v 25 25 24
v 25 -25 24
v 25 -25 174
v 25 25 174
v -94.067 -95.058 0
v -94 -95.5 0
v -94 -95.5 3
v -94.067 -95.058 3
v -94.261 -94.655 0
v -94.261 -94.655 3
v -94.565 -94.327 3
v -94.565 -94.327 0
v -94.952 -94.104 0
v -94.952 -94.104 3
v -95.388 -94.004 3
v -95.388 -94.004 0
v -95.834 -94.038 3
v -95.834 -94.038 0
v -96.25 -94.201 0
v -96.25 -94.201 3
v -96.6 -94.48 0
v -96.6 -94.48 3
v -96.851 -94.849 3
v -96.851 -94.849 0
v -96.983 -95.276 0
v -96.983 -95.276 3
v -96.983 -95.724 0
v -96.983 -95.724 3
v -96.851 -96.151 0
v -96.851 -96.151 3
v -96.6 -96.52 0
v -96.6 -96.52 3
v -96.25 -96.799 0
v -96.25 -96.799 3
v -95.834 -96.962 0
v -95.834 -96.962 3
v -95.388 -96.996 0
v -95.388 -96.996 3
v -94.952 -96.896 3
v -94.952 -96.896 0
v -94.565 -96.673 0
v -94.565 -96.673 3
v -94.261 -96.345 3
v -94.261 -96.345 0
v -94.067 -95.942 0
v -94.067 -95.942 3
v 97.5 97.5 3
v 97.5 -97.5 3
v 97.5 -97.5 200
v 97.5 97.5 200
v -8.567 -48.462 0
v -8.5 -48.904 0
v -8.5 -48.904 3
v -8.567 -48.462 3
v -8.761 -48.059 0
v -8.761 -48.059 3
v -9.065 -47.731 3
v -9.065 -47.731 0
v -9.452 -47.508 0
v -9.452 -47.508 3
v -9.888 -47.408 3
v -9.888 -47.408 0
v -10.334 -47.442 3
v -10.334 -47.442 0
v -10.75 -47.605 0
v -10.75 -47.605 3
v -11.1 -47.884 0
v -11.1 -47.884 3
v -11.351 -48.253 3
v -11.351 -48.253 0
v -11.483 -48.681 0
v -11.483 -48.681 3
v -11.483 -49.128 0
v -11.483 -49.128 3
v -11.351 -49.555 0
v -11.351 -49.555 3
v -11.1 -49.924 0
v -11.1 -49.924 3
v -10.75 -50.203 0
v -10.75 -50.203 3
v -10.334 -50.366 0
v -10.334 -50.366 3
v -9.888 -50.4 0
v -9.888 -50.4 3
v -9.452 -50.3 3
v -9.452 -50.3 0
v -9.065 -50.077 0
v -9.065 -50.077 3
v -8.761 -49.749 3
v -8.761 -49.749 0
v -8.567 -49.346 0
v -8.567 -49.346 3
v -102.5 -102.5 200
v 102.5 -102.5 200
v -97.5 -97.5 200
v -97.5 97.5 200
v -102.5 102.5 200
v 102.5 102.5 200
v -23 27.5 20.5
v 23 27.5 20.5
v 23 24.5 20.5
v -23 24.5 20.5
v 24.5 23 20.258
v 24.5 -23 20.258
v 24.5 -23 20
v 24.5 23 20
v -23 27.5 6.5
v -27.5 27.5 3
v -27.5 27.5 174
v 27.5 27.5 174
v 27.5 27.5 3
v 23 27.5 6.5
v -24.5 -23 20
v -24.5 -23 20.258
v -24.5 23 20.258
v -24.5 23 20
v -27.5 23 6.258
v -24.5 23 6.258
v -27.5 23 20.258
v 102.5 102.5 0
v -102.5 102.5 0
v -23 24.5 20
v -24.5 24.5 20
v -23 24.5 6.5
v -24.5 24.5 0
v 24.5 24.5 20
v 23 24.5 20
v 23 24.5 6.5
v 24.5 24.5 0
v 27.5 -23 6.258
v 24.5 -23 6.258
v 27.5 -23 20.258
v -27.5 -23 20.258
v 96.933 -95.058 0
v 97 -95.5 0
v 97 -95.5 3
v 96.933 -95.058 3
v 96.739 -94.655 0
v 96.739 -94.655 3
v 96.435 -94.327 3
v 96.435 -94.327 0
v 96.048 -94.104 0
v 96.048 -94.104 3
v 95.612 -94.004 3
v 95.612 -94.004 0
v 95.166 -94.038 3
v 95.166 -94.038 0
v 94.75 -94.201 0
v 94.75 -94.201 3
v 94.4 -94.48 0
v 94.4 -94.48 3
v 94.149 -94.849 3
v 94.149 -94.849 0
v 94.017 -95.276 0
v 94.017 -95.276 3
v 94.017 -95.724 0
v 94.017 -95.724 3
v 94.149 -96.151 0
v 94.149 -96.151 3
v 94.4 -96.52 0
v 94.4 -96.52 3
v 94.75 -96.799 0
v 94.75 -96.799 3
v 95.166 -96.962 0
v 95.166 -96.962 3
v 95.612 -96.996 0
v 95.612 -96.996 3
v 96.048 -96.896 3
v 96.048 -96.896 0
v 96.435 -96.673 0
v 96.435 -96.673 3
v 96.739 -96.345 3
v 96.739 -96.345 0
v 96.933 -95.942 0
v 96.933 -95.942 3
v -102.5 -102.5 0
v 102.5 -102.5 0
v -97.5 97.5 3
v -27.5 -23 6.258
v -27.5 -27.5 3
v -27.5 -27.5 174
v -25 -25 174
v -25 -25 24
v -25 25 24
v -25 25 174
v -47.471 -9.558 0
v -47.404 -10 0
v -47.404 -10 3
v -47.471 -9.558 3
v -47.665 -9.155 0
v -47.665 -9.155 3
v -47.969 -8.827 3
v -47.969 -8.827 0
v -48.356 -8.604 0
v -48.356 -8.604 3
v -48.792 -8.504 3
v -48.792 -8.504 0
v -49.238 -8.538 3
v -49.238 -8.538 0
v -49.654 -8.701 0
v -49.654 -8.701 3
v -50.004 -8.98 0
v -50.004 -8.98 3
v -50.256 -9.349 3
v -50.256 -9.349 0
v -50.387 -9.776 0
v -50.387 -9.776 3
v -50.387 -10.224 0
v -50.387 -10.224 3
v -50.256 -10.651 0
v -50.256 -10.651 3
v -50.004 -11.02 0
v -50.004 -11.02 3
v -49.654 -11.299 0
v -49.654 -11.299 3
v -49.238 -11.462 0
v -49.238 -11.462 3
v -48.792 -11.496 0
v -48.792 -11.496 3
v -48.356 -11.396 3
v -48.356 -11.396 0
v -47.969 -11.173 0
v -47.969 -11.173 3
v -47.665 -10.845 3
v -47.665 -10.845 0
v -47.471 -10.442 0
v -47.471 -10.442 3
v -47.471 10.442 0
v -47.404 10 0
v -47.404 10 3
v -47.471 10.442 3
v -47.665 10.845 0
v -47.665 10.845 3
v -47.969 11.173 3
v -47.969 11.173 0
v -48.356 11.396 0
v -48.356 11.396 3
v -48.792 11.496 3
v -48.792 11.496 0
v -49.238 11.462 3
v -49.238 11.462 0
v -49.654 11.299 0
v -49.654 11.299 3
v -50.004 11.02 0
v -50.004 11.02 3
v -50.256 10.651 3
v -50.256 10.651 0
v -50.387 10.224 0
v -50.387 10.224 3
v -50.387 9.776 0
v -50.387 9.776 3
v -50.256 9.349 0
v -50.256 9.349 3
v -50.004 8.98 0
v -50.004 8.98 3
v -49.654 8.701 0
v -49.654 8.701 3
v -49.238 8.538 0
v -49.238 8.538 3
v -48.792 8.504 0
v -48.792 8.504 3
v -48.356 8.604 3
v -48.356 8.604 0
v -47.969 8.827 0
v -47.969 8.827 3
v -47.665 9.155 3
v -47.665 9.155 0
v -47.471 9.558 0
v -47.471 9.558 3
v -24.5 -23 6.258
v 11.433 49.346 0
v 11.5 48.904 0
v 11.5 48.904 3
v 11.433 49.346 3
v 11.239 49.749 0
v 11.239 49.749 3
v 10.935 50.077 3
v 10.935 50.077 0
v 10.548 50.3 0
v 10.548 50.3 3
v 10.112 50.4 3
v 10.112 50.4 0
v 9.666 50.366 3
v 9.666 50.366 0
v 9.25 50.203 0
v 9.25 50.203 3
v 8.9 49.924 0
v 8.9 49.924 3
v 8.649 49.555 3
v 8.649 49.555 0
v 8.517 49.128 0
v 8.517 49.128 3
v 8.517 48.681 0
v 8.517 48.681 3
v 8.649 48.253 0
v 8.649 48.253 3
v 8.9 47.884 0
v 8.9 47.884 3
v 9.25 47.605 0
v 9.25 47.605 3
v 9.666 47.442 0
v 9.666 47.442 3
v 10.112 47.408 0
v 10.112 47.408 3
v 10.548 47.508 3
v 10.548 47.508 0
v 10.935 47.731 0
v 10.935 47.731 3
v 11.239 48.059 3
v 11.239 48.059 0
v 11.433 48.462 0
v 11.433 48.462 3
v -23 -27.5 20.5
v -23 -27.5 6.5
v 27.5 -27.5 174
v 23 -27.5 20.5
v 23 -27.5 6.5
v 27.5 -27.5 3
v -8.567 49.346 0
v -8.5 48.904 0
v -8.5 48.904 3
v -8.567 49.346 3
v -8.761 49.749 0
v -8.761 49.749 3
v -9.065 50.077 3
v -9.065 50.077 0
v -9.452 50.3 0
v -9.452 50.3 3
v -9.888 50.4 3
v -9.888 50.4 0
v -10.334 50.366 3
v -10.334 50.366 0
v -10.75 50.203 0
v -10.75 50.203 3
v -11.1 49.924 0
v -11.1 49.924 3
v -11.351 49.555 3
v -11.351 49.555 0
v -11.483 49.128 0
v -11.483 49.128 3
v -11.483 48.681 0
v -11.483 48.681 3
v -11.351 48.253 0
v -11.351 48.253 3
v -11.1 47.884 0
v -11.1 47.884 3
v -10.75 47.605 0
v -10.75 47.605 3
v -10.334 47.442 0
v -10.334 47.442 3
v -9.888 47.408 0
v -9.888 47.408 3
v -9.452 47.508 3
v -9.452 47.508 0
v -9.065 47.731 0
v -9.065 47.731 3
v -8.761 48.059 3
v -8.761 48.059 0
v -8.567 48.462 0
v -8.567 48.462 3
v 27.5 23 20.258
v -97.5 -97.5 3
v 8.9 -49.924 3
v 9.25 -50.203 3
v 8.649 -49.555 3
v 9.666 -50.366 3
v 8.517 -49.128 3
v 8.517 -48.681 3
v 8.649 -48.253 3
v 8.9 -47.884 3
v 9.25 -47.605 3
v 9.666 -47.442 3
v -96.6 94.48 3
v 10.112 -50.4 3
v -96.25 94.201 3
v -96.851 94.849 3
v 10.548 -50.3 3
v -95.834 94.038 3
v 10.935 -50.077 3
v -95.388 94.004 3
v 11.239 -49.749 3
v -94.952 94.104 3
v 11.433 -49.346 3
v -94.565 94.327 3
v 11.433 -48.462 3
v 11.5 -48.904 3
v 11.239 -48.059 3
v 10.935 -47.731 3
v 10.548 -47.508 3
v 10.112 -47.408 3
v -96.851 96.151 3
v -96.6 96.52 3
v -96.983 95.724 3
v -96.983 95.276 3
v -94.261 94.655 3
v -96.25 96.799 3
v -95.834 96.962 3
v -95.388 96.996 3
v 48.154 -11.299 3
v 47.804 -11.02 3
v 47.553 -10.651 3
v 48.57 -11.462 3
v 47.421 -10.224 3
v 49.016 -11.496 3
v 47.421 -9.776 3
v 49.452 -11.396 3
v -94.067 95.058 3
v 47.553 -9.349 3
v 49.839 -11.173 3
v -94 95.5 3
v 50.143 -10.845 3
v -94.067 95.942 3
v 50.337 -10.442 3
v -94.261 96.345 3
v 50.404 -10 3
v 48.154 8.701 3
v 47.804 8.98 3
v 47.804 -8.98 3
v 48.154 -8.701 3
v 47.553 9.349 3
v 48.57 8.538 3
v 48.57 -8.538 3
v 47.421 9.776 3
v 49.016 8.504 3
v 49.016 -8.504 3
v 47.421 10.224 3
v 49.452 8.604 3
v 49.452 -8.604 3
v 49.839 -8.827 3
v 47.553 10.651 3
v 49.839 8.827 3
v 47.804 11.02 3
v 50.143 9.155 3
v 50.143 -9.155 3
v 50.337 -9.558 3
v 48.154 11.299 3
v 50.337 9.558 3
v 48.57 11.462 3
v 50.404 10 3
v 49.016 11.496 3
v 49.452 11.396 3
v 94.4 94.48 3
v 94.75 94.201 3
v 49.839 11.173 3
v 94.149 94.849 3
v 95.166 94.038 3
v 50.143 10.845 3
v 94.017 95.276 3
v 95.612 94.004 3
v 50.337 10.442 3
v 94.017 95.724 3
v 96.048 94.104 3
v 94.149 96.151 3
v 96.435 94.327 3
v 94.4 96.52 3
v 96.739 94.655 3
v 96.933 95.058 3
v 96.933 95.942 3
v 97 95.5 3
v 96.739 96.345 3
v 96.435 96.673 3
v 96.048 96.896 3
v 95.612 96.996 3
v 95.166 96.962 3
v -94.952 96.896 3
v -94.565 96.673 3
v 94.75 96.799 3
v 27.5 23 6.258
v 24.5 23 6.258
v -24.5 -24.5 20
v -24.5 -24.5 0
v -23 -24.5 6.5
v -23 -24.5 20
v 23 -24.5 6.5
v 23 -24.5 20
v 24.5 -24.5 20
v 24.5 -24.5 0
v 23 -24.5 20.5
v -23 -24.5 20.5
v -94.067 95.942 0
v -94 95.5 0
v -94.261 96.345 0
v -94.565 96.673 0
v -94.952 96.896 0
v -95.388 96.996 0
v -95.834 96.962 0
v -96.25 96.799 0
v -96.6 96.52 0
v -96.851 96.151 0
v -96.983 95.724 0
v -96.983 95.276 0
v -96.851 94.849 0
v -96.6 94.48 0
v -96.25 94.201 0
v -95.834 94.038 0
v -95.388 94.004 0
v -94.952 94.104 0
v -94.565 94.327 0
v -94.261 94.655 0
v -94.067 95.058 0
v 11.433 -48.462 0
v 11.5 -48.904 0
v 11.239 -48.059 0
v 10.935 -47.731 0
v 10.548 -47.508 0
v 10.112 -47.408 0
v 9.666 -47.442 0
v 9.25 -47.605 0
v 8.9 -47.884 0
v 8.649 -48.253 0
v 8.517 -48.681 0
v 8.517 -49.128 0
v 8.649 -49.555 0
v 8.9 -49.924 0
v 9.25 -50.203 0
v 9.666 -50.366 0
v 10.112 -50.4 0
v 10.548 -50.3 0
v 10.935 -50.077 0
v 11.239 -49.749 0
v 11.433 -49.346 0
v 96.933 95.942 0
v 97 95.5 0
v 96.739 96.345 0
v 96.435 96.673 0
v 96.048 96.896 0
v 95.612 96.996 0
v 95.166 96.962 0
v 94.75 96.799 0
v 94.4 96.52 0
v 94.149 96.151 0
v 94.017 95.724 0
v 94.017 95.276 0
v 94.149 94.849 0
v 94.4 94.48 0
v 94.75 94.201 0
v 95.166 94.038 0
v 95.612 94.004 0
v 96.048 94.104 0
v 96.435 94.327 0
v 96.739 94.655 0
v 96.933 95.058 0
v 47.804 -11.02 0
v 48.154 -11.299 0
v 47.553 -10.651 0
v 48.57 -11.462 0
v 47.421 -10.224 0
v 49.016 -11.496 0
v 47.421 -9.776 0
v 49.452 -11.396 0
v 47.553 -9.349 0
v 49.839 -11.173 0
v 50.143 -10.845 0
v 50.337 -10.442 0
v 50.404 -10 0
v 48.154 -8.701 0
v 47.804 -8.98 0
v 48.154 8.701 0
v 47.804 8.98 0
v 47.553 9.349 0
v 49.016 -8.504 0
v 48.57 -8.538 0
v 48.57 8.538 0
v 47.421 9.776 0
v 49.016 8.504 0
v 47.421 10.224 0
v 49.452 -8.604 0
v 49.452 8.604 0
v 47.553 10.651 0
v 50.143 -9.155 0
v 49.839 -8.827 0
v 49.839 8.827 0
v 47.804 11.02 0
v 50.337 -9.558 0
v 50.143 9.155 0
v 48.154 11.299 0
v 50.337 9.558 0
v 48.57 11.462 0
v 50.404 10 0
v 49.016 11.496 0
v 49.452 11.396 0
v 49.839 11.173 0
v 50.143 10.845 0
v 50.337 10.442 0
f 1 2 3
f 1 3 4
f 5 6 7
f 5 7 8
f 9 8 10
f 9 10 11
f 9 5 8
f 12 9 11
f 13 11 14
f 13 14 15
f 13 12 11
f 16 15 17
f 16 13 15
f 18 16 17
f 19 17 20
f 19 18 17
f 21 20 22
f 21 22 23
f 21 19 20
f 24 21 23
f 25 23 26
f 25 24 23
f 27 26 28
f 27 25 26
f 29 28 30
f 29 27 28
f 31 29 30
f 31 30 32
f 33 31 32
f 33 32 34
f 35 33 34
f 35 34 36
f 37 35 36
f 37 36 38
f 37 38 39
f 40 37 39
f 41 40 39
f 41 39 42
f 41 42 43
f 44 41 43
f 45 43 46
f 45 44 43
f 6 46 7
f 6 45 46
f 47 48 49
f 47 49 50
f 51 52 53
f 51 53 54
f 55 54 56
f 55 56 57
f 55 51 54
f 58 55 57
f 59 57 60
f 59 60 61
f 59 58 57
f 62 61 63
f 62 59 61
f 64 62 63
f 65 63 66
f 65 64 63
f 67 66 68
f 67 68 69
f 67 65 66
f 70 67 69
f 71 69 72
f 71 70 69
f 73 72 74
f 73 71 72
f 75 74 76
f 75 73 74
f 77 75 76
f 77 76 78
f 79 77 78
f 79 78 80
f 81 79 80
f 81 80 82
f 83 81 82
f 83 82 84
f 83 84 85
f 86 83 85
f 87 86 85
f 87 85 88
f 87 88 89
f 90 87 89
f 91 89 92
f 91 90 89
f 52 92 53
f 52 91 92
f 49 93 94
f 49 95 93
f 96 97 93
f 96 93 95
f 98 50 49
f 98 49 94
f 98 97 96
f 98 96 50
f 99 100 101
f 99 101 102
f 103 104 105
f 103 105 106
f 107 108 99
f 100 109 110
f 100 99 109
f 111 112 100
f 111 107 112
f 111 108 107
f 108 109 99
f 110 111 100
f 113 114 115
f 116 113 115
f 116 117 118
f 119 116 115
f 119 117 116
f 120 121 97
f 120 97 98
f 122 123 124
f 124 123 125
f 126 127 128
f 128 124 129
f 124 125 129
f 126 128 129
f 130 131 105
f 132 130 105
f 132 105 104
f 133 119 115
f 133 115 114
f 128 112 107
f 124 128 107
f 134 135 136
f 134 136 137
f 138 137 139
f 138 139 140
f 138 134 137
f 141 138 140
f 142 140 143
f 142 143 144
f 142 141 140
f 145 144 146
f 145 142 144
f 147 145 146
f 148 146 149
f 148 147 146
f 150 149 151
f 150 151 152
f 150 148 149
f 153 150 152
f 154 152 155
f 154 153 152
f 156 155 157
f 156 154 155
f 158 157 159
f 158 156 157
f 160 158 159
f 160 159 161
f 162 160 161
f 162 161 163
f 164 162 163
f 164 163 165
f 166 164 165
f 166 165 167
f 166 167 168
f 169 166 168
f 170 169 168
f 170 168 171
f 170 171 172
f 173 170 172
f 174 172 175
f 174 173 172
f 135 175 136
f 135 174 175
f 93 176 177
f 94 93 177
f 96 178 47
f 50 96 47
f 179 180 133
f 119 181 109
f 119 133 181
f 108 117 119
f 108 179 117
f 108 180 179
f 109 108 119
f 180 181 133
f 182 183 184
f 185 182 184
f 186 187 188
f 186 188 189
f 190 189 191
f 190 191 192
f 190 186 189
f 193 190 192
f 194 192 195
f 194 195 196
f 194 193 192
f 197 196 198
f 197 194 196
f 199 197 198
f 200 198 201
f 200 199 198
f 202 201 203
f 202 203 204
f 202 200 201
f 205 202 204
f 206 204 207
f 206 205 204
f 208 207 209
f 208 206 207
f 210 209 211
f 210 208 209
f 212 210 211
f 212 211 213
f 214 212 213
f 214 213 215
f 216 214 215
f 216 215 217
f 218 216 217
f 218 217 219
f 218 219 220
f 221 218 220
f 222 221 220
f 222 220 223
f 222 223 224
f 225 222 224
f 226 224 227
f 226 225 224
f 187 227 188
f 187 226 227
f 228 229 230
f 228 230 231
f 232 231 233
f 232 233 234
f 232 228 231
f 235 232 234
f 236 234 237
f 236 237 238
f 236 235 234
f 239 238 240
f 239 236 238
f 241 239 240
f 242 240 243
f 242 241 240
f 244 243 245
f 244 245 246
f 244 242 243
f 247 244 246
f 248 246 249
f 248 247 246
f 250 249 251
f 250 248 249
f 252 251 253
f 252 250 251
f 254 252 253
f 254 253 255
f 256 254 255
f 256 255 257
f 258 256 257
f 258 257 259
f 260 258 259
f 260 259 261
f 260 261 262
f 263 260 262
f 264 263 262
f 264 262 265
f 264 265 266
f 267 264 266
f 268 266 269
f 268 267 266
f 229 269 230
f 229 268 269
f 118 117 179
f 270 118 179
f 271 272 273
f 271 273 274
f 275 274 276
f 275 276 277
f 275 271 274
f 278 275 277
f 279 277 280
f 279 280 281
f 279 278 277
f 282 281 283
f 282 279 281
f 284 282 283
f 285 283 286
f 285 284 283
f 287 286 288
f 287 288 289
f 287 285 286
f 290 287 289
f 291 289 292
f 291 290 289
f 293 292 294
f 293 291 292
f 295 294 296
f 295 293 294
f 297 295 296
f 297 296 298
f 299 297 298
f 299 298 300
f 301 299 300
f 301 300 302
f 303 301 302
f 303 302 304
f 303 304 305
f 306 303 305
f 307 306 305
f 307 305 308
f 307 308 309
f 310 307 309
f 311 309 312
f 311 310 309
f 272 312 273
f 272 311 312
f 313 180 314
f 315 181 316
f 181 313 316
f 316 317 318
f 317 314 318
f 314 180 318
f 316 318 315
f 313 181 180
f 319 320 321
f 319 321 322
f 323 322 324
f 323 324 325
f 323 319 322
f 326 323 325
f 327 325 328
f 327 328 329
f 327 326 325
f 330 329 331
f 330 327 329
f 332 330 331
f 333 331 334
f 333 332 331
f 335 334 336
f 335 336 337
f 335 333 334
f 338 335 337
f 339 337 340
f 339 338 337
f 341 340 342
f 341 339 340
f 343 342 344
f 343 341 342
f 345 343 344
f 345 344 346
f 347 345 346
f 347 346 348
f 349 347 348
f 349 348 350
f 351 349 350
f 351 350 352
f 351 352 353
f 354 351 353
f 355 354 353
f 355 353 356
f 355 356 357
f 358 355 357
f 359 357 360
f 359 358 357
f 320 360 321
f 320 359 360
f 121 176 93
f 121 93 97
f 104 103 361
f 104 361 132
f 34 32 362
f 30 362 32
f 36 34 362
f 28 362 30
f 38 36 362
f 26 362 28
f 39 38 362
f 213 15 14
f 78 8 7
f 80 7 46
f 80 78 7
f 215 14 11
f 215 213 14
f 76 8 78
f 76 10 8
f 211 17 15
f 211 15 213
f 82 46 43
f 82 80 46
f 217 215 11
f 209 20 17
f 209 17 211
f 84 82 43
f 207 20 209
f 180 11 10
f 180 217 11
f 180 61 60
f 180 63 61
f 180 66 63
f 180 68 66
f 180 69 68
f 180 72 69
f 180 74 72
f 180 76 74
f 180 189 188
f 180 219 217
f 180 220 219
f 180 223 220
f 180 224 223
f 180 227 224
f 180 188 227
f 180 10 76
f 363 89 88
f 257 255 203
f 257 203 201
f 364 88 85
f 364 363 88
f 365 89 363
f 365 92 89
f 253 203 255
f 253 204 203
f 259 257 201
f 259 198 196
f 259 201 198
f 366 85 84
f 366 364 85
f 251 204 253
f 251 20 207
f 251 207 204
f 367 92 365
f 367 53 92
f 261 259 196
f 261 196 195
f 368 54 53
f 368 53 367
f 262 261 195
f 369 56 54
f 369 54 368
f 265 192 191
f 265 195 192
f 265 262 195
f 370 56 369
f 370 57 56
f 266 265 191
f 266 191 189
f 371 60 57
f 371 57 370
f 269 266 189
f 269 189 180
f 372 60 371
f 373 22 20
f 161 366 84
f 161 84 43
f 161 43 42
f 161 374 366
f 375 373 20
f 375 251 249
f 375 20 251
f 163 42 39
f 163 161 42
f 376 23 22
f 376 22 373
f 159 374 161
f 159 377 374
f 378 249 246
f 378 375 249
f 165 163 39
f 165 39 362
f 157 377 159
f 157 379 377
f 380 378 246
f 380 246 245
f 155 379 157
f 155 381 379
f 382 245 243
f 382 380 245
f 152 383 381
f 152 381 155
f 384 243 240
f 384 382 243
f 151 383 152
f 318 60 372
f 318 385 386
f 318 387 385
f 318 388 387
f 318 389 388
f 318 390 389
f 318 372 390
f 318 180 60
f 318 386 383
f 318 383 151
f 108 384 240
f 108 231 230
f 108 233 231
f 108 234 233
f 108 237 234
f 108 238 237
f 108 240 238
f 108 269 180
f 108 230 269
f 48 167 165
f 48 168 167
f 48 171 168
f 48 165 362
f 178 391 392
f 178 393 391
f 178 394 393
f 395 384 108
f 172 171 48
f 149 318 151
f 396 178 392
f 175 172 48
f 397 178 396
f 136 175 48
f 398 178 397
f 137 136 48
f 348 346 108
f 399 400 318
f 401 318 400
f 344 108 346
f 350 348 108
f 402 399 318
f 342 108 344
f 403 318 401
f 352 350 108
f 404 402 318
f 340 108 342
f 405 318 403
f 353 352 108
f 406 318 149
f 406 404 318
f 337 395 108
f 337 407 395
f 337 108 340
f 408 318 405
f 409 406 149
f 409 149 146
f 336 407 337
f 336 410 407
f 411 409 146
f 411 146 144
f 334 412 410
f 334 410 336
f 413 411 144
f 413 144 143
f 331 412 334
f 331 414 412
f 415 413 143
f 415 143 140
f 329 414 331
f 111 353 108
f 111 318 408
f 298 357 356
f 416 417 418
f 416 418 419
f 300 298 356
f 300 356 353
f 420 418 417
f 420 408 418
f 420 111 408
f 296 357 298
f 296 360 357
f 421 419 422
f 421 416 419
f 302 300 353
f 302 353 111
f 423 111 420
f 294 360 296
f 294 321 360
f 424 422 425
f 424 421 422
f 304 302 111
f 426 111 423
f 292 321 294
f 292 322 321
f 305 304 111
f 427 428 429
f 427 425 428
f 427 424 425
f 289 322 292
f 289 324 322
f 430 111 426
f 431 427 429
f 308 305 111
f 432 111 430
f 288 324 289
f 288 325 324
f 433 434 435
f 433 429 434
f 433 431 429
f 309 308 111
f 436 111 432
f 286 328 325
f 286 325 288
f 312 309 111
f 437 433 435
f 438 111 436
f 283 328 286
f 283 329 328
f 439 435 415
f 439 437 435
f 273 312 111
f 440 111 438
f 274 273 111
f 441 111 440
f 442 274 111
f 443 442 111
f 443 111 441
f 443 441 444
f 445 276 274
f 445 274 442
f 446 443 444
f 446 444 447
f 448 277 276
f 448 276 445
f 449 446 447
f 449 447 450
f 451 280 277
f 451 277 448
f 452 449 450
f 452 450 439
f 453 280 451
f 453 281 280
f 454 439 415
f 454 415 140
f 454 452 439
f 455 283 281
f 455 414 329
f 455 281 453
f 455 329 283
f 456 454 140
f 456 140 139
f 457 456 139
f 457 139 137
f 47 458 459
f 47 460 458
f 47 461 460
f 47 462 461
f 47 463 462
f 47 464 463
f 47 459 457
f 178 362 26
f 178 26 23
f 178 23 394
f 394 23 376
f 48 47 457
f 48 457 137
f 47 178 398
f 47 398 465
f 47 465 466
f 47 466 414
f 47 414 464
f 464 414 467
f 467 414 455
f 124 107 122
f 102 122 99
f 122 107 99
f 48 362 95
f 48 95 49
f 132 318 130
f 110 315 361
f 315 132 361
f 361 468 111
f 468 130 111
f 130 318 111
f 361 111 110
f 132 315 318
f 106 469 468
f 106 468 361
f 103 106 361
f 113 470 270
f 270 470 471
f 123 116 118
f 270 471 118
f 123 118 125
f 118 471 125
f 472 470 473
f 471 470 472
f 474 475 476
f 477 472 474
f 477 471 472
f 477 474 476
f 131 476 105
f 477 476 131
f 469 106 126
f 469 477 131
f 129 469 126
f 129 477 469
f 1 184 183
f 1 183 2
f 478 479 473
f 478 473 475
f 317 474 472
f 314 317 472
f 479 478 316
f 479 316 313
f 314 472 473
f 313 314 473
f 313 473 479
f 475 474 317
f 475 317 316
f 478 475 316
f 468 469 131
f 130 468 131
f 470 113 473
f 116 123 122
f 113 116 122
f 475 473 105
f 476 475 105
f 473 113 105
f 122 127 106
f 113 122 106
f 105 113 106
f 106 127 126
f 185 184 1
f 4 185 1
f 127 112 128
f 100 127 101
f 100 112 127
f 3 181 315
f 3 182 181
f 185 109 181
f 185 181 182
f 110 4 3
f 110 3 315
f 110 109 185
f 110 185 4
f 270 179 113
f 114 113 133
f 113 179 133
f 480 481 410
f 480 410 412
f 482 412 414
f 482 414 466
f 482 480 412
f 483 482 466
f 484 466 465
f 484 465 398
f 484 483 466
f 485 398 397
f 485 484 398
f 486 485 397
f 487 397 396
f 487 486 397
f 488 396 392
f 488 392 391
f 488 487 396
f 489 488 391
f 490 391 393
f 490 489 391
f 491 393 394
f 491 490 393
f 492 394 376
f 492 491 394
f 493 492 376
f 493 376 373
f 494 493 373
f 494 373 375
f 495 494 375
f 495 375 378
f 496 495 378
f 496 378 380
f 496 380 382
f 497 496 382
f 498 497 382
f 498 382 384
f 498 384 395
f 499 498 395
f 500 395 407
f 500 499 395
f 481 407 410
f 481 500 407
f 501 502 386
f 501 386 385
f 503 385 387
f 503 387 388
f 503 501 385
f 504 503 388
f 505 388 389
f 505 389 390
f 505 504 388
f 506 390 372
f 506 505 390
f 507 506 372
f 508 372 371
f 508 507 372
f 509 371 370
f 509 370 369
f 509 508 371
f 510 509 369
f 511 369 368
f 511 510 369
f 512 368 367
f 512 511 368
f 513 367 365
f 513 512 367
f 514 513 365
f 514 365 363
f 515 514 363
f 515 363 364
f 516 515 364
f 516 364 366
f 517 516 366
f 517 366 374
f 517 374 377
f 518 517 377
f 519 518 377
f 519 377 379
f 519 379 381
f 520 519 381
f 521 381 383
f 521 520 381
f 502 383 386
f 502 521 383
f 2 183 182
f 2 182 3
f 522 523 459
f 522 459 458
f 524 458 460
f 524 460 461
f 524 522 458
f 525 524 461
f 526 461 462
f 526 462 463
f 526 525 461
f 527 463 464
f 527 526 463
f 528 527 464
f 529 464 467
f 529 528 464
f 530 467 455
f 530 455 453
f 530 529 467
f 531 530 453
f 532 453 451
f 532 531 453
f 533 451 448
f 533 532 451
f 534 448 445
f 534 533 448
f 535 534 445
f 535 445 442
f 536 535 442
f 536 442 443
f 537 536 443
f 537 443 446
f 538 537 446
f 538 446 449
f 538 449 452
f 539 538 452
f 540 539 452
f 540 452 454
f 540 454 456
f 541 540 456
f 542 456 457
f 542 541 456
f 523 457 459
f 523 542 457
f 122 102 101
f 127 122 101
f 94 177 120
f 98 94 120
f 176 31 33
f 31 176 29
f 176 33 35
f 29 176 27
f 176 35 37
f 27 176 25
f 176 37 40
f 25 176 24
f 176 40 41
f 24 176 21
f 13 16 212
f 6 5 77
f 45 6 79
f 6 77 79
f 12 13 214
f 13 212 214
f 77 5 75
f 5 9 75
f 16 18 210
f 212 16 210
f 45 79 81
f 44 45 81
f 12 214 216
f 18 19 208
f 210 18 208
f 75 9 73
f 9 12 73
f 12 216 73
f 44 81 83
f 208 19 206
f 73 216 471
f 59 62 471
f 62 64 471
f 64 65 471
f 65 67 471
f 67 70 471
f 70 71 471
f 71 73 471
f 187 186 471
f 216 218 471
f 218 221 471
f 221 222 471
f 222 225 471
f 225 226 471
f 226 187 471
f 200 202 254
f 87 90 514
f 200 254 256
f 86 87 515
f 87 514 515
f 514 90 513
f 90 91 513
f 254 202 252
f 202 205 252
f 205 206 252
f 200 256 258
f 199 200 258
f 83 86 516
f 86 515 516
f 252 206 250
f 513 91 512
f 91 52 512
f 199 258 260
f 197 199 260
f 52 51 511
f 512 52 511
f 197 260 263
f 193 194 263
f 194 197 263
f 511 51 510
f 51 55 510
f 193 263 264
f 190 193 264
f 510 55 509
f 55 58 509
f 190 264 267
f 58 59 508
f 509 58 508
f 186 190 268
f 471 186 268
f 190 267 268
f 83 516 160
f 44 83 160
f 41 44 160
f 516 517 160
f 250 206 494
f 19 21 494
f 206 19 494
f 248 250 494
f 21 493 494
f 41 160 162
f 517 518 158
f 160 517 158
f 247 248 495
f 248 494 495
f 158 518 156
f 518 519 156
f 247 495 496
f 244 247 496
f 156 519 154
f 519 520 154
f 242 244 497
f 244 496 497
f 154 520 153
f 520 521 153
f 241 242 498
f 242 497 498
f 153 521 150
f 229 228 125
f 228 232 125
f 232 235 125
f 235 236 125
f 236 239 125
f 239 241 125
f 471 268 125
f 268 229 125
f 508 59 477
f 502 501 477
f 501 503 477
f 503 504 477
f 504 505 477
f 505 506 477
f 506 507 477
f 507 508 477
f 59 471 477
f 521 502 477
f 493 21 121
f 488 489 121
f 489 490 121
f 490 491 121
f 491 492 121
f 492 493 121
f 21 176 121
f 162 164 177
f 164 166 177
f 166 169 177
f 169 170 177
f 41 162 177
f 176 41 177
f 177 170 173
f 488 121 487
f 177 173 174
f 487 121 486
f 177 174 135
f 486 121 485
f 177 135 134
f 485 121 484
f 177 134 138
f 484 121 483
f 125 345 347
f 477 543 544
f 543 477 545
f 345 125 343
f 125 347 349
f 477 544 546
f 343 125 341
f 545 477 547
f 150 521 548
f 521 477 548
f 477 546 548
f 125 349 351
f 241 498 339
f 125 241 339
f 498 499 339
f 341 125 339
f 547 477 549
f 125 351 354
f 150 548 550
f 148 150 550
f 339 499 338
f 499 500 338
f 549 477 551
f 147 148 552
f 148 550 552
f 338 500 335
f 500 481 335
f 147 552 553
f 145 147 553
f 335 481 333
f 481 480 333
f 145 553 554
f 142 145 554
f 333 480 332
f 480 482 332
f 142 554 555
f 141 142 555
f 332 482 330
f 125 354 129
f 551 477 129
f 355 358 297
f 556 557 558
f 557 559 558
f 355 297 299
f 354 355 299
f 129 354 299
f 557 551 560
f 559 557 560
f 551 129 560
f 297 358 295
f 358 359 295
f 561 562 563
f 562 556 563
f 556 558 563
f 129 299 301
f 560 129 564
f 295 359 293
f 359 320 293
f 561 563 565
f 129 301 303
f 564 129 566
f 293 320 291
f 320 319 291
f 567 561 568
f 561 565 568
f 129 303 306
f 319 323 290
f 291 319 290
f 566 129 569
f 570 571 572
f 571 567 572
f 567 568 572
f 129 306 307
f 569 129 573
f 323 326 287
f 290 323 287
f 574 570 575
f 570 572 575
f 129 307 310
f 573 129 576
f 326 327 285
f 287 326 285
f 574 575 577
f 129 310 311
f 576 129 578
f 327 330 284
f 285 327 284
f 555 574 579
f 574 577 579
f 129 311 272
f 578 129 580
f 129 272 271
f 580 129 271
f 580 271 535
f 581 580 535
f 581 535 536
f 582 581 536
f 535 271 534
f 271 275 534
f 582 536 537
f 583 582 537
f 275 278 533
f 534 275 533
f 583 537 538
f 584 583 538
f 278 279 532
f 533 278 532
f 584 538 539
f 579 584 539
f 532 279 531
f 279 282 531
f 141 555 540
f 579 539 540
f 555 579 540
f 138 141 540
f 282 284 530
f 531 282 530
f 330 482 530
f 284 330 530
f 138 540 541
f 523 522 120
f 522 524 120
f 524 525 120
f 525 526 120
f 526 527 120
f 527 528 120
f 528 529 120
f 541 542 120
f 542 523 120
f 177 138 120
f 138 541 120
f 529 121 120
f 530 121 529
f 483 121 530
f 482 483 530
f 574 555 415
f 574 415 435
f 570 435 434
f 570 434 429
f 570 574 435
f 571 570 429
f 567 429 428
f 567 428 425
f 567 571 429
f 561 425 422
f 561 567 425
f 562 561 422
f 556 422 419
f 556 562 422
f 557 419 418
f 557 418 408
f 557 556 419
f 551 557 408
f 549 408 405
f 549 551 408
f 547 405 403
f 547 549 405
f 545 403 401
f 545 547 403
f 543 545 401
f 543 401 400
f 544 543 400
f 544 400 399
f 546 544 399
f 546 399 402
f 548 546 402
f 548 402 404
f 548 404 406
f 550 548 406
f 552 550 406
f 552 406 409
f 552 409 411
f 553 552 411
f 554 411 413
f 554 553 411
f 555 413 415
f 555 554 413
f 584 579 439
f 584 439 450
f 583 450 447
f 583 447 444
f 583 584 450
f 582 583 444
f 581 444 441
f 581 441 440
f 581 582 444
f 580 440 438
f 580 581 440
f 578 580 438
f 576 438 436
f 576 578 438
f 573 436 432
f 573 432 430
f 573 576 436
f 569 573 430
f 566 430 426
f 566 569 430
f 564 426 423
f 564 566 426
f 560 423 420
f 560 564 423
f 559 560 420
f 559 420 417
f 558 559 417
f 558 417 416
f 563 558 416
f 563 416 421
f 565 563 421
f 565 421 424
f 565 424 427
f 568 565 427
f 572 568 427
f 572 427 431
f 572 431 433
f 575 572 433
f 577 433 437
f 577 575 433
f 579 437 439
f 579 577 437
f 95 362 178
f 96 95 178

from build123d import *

# Parameters (mm, degrees)
F0_W      = 205
F0_H      = 205
F0_W_2    = 195
F0_H_2    = 195
F1_DEPTH  = 200
F0_R      = 1.5
F0_W_3    = 55
F0_H_3    = 55
F2_DEPTH  = 3
F0_W_4    = 49
F0_H_4    = 49
F3_DEPTH  = 24
F4_W      = 46
F4_H      = 14
F5_DEPTH  = 60
F6_W      = 46
F6_H      = 14
F7_DEPTH  = 60
F8_W      = 49
F8_H      = 49
F9_DEPTH  = 4
F10_W     = 55
F10_H     = 55
F10_W_2   = 50
F10_H_2   = 50
F11_DEPTH = 150


with BuildPart() as f1:
    # F0 (on Top) → F1 (new body)
    with BuildSketch(Plane.XY):
        Rectangle(F0_W, F0_H)
        Rectangle(F0_W_2, F0_H_2, mode=Mode.SUBTRACT)
    extrude(amount=F1_DEPTH)

    # F0 (on Top) → F2 (join)
    with BuildSketch(Plane.XY):
        Rectangle(F0_W_2, F0_H_2)
        with Locations((-95.5, -95.5)):
            Circle(F0_R, mode=Mode.SUBTRACT)
        with Locations((-10, -48.9040691386)):
            Circle(F0_R, mode=Mode.SUBTRACT)
        with Locations((-48.9040691386, -10)):
            Circle(F0_R, mode=Mode.SUBTRACT)
        with Locations((95.5, -95.5)):
            Circle(F0_R, mode=Mode.SUBTRACT)
        with Locations((10, -48.9040691386)):
            Circle(F0_R, mode=Mode.SUBTRACT)
        with Locations((48.9040691386, -10)):
            Circle(F0_R, mode=Mode.SUBTRACT)
        with Locations((-48.9040691386, 10)):
            Circle(F0_R, mode=Mode.SUBTRACT)
        with Locations((-10, 48.9040691386)):
            Circle(F0_R, mode=Mode.SUBTRACT)
        with Locations((-95.5, 95.5)):
            Circle(F0_R, mode=Mode.SUBTRACT)
        Rectangle(F0_W_3, F0_H_3, mode=Mode.SUBTRACT)
        with Locations((48.9040691386, 10)):
            Circle(F0_R, mode=Mode.SUBTRACT)
        with Locations((10, 48.9040691386)):
            Circle(F0_R, mode=Mode.SUBTRACT)
        with Locations((95.5, 95.5)):
            Circle(F0_R, mode=Mode.SUBTRACT)
    extrude(amount=F2_DEPTH)

    # F0 (on Top) → F3 (join)
    with BuildSketch(Plane.XY):
        Rectangle(F0_W_3, F0_H_3)
        Rectangle(F0_W_4, F0_H_4, mode=Mode.SUBTRACT)
    extrude(amount=F3_DEPTH)

    # F4 (on face) → F5 (cut)
    with BuildSketch(Plane(origin=(-27.5, 0, 0), x_dir=(0, -1, 0), z_dir=(-1, 0, 0))):
        with Locations((0, 13.2578094924)):
            Rectangle(F4_W, F4_H)
    extrude(amount=-F5_DEPTH, mode=Mode.SUBTRACT)

    # F6 (on face) → F7 (cut)
    with BuildSketch(Plane(origin=(0, 27.5, 0), x_dir=(-1, 0, 0), z_dir=(0, 1, 0))):
        with Locations((0, 13.5)):
            Rectangle(F6_W, F6_H)
    extrude(amount=-F7_DEPTH, mode=Mode.SUBTRACT)

    # F8 (on face) → F9 (join)
    with BuildSketch(Plane.XY.offset(24)):
        Rectangle(F8_W, F8_H)
    extrude(amount=-F9_DEPTH)

    # F10 (on face) → F11 (join)
    with BuildSketch(Plane.XY.offset(24)):
        Rectangle(F10_W, F10_H)
        Rectangle(F10_W_2, F10_H_2, mode=Mode.SUBTRACT)
    extrude(amount=F11_DEPTH)


solid = f1.part
